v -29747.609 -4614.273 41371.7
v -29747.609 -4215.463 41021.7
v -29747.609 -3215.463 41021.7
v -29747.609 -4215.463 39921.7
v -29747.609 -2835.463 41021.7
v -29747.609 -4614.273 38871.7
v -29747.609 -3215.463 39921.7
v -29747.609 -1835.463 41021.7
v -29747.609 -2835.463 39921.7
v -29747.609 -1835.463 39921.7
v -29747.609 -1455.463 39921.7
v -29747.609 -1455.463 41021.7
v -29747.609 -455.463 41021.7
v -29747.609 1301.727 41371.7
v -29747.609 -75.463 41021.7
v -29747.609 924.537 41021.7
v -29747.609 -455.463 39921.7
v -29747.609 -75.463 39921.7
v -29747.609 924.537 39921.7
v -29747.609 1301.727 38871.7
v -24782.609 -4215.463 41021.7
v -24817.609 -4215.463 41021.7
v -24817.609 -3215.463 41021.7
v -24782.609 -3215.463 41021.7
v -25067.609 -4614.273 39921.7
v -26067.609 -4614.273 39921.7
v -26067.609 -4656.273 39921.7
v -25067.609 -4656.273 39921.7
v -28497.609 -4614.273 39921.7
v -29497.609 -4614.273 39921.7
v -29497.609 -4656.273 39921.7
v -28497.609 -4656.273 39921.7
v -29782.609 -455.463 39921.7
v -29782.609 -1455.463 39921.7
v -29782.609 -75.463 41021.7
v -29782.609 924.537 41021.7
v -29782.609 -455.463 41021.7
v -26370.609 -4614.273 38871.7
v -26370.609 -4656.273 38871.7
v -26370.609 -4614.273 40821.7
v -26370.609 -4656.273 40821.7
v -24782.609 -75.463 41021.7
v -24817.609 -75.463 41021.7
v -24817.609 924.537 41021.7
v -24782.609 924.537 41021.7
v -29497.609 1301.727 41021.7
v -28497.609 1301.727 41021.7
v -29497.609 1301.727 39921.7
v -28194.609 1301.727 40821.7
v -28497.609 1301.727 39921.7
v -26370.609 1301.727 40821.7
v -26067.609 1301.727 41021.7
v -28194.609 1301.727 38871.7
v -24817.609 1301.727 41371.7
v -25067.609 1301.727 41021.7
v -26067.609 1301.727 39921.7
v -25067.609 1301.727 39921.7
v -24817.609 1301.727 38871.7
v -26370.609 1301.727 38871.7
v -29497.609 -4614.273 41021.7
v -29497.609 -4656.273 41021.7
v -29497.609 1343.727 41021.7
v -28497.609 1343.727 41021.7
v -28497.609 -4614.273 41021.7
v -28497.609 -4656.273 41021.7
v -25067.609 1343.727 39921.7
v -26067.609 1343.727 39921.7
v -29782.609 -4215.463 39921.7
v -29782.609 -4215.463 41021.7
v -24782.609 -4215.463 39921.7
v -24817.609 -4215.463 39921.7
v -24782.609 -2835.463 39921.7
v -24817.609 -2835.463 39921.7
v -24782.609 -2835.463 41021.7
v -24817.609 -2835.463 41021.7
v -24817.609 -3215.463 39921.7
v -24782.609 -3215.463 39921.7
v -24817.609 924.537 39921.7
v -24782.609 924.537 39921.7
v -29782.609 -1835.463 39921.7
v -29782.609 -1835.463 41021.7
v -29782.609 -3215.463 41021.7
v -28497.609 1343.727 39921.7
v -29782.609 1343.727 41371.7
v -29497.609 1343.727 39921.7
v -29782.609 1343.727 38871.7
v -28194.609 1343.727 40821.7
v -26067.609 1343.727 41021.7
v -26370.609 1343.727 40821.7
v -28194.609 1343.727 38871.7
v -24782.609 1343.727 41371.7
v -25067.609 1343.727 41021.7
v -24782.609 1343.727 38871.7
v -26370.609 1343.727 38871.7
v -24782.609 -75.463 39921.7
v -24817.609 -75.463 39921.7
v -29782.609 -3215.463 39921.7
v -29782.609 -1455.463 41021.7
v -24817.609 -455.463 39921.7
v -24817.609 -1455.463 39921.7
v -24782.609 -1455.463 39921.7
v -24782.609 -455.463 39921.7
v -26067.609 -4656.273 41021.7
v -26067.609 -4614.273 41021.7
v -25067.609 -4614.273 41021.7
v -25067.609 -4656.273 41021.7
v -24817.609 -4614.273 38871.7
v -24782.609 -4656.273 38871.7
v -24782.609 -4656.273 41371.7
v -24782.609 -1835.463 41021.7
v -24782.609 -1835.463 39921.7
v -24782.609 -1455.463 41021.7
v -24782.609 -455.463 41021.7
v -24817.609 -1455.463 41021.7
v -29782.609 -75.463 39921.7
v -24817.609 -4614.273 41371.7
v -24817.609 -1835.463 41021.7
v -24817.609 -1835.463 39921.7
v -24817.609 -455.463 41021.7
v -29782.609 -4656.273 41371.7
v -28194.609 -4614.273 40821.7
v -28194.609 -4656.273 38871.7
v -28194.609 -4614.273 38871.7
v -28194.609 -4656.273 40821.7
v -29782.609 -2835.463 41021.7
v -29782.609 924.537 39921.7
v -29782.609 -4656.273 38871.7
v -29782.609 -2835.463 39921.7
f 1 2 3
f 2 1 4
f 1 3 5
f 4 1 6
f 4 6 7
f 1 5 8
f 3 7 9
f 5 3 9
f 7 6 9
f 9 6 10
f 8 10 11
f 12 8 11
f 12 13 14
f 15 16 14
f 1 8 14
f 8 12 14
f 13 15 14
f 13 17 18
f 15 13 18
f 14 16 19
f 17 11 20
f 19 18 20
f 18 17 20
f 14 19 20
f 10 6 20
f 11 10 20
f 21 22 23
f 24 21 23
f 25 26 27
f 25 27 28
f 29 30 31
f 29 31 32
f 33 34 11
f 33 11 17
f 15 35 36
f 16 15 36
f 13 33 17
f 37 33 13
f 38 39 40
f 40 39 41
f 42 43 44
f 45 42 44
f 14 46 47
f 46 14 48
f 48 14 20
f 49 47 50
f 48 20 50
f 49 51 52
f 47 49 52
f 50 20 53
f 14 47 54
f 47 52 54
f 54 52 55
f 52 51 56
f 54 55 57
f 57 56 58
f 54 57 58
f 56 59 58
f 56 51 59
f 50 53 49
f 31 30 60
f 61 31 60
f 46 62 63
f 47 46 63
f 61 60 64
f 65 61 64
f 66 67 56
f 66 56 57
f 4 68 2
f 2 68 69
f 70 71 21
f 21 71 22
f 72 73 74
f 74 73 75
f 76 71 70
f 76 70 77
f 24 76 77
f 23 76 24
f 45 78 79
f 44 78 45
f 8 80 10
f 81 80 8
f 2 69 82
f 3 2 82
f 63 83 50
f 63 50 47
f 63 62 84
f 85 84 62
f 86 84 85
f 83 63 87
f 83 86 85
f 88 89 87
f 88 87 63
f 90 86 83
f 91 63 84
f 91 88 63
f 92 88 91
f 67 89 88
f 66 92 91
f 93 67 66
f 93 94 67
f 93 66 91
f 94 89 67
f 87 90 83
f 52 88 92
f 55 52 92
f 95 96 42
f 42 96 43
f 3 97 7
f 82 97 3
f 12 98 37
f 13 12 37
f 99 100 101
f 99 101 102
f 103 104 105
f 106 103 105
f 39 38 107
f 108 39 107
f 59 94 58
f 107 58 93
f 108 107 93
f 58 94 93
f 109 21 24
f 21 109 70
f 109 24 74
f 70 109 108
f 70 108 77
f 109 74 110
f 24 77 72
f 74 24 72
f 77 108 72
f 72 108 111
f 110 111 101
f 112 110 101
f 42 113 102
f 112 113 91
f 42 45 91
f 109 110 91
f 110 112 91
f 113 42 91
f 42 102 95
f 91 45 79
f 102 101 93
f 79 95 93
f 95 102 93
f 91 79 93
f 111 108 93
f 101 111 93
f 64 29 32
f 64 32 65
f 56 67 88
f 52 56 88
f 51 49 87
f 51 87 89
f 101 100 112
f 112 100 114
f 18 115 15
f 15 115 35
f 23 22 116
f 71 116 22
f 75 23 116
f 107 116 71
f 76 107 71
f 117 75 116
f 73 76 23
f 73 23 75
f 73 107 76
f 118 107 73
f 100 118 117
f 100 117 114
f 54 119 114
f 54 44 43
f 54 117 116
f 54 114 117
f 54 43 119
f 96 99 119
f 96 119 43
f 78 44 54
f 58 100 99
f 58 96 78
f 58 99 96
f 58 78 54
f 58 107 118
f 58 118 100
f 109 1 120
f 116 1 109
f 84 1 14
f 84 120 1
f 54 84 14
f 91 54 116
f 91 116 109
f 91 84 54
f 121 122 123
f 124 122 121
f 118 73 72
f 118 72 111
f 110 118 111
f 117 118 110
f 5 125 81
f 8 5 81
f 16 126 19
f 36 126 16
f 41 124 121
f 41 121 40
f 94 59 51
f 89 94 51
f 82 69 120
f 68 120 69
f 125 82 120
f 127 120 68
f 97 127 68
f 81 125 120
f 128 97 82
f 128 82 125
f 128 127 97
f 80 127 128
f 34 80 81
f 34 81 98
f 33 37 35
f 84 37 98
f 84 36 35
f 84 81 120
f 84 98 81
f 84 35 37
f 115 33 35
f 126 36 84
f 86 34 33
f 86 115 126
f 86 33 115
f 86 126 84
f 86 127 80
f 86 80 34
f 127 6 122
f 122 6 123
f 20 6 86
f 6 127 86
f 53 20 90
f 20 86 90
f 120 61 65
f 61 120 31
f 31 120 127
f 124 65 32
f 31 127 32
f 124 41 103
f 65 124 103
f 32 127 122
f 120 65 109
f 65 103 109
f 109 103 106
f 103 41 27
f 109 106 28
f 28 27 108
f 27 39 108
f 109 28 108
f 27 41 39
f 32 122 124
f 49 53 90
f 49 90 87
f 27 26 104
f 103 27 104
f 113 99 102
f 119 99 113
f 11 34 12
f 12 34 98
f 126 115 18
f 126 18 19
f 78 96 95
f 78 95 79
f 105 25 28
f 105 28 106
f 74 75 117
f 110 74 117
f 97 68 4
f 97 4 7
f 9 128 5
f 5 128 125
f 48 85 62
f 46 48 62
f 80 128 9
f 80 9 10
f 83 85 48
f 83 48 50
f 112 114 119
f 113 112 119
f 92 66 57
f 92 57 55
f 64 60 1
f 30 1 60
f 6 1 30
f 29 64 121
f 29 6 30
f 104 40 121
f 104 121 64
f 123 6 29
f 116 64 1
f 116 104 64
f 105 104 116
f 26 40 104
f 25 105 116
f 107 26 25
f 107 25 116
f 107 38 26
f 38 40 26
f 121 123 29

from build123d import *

# Parameters (mm, degrees)
SKETCH1_W           = 5000
SKETCH1_H           = 6000
SKETCH1_W_2         = 4930
SKETCH1_H_2         = 5916
BOSS_EXTRUDE1_DEPTH = 2500
SKETCH2_W           = 1100
SKETCH2_H           = 1000
CUT_EXTRUDE1_DEPTH  = 5531
CUT_EXTRUDE2_START  = -2597
SKETCH3_W           = 1000
SKETCH3_H           = 1100
CUT_EXTRUDE2_DEPTH  = 9647
SKETCH6_W           = 1824
SKETCH6_H           = 1950
CUT_EXTRUDE3_DEPTH  = 8265
LPATTERN2_COUNT     = 2
LPATTERN2_PITCH     = 3430
LPATTERN3_COUNT     = 4
LPATTERN3_PITCH     = 1380


with BuildPart() as part:
    # Sketch1 → Boss-Extrude1 (new body)
    with BuildSketch(Plane.XY.offset(38871.700196057)):
        with Locations((-27282.609122173, -1656.273034315)):
            Rectangle(SKETCH1_W, SKETCH1_H)
        with Locations((-27282.609122173, -1656.273034315)):
            Rectangle(SKETCH1_W_2, SKETCH1_H_2, mode=Mode.SUBTRACT)
    extrude(amount=BOSS_EXTRUDE1_DEPTH)

    # Sketch2 → Cut-Extrude1 (cut)
    with BuildSketch(Plane.ZY.offset(29782.609122173)):
        with Locations((40471.700196057, 424.5367891)):
            Rectangle(SKETCH2_W, SKETCH2_H)
    cut_extrude1 = extrude(amount=-CUT_EXTRUDE1_DEPTH, mode=Mode.SUBTRACT)

    # Sketch3 → Cut-Extrude2 (cut)
    with BuildSketch(Plane.XZ.offset(-1301.726965685).offset(CUT_EXTRUDE2_START)):
        with Locations((-25567.609122173, 40471.700196057)):
            Rectangle(SKETCH3_W, SKETCH3_H)
    cut_extrude2 = extrude(amount=CUT_EXTRUDE2_DEPTH, mode=Mode.SUBTRACT)

    # Sketch6 → Cut-Extrude3 (cut)
    with BuildSketch(Plane.XZ.offset(4656.273034315)):
        with Locations((-27282.609122173, 39846.700196057)):
            Rectangle(SKETCH6_W, SKETCH6_H)
    extrude(amount=-CUT_EXTRUDE3_DEPTH, mode=Mode.SUBTRACT)

    # LPattern2: Cut-Extrude2 ×2
    with Locations(*[(-i * LPATTERN2_PITCH, 0, 0) for i in range(1, LPATTERN2_COUNT)]):
        add(cut_extrude2, mode=Mode.SUBTRACT)

    # LPattern3: Cut-Extrude1 ×4
    with Locations(*[(0, -i * LPATTERN3_PITCH, 0) for i in range(1, LPATTERN3_COUNT)]):
        add(cut_extrude1, mode=Mode.SUBTRACT)


solid = part.part
